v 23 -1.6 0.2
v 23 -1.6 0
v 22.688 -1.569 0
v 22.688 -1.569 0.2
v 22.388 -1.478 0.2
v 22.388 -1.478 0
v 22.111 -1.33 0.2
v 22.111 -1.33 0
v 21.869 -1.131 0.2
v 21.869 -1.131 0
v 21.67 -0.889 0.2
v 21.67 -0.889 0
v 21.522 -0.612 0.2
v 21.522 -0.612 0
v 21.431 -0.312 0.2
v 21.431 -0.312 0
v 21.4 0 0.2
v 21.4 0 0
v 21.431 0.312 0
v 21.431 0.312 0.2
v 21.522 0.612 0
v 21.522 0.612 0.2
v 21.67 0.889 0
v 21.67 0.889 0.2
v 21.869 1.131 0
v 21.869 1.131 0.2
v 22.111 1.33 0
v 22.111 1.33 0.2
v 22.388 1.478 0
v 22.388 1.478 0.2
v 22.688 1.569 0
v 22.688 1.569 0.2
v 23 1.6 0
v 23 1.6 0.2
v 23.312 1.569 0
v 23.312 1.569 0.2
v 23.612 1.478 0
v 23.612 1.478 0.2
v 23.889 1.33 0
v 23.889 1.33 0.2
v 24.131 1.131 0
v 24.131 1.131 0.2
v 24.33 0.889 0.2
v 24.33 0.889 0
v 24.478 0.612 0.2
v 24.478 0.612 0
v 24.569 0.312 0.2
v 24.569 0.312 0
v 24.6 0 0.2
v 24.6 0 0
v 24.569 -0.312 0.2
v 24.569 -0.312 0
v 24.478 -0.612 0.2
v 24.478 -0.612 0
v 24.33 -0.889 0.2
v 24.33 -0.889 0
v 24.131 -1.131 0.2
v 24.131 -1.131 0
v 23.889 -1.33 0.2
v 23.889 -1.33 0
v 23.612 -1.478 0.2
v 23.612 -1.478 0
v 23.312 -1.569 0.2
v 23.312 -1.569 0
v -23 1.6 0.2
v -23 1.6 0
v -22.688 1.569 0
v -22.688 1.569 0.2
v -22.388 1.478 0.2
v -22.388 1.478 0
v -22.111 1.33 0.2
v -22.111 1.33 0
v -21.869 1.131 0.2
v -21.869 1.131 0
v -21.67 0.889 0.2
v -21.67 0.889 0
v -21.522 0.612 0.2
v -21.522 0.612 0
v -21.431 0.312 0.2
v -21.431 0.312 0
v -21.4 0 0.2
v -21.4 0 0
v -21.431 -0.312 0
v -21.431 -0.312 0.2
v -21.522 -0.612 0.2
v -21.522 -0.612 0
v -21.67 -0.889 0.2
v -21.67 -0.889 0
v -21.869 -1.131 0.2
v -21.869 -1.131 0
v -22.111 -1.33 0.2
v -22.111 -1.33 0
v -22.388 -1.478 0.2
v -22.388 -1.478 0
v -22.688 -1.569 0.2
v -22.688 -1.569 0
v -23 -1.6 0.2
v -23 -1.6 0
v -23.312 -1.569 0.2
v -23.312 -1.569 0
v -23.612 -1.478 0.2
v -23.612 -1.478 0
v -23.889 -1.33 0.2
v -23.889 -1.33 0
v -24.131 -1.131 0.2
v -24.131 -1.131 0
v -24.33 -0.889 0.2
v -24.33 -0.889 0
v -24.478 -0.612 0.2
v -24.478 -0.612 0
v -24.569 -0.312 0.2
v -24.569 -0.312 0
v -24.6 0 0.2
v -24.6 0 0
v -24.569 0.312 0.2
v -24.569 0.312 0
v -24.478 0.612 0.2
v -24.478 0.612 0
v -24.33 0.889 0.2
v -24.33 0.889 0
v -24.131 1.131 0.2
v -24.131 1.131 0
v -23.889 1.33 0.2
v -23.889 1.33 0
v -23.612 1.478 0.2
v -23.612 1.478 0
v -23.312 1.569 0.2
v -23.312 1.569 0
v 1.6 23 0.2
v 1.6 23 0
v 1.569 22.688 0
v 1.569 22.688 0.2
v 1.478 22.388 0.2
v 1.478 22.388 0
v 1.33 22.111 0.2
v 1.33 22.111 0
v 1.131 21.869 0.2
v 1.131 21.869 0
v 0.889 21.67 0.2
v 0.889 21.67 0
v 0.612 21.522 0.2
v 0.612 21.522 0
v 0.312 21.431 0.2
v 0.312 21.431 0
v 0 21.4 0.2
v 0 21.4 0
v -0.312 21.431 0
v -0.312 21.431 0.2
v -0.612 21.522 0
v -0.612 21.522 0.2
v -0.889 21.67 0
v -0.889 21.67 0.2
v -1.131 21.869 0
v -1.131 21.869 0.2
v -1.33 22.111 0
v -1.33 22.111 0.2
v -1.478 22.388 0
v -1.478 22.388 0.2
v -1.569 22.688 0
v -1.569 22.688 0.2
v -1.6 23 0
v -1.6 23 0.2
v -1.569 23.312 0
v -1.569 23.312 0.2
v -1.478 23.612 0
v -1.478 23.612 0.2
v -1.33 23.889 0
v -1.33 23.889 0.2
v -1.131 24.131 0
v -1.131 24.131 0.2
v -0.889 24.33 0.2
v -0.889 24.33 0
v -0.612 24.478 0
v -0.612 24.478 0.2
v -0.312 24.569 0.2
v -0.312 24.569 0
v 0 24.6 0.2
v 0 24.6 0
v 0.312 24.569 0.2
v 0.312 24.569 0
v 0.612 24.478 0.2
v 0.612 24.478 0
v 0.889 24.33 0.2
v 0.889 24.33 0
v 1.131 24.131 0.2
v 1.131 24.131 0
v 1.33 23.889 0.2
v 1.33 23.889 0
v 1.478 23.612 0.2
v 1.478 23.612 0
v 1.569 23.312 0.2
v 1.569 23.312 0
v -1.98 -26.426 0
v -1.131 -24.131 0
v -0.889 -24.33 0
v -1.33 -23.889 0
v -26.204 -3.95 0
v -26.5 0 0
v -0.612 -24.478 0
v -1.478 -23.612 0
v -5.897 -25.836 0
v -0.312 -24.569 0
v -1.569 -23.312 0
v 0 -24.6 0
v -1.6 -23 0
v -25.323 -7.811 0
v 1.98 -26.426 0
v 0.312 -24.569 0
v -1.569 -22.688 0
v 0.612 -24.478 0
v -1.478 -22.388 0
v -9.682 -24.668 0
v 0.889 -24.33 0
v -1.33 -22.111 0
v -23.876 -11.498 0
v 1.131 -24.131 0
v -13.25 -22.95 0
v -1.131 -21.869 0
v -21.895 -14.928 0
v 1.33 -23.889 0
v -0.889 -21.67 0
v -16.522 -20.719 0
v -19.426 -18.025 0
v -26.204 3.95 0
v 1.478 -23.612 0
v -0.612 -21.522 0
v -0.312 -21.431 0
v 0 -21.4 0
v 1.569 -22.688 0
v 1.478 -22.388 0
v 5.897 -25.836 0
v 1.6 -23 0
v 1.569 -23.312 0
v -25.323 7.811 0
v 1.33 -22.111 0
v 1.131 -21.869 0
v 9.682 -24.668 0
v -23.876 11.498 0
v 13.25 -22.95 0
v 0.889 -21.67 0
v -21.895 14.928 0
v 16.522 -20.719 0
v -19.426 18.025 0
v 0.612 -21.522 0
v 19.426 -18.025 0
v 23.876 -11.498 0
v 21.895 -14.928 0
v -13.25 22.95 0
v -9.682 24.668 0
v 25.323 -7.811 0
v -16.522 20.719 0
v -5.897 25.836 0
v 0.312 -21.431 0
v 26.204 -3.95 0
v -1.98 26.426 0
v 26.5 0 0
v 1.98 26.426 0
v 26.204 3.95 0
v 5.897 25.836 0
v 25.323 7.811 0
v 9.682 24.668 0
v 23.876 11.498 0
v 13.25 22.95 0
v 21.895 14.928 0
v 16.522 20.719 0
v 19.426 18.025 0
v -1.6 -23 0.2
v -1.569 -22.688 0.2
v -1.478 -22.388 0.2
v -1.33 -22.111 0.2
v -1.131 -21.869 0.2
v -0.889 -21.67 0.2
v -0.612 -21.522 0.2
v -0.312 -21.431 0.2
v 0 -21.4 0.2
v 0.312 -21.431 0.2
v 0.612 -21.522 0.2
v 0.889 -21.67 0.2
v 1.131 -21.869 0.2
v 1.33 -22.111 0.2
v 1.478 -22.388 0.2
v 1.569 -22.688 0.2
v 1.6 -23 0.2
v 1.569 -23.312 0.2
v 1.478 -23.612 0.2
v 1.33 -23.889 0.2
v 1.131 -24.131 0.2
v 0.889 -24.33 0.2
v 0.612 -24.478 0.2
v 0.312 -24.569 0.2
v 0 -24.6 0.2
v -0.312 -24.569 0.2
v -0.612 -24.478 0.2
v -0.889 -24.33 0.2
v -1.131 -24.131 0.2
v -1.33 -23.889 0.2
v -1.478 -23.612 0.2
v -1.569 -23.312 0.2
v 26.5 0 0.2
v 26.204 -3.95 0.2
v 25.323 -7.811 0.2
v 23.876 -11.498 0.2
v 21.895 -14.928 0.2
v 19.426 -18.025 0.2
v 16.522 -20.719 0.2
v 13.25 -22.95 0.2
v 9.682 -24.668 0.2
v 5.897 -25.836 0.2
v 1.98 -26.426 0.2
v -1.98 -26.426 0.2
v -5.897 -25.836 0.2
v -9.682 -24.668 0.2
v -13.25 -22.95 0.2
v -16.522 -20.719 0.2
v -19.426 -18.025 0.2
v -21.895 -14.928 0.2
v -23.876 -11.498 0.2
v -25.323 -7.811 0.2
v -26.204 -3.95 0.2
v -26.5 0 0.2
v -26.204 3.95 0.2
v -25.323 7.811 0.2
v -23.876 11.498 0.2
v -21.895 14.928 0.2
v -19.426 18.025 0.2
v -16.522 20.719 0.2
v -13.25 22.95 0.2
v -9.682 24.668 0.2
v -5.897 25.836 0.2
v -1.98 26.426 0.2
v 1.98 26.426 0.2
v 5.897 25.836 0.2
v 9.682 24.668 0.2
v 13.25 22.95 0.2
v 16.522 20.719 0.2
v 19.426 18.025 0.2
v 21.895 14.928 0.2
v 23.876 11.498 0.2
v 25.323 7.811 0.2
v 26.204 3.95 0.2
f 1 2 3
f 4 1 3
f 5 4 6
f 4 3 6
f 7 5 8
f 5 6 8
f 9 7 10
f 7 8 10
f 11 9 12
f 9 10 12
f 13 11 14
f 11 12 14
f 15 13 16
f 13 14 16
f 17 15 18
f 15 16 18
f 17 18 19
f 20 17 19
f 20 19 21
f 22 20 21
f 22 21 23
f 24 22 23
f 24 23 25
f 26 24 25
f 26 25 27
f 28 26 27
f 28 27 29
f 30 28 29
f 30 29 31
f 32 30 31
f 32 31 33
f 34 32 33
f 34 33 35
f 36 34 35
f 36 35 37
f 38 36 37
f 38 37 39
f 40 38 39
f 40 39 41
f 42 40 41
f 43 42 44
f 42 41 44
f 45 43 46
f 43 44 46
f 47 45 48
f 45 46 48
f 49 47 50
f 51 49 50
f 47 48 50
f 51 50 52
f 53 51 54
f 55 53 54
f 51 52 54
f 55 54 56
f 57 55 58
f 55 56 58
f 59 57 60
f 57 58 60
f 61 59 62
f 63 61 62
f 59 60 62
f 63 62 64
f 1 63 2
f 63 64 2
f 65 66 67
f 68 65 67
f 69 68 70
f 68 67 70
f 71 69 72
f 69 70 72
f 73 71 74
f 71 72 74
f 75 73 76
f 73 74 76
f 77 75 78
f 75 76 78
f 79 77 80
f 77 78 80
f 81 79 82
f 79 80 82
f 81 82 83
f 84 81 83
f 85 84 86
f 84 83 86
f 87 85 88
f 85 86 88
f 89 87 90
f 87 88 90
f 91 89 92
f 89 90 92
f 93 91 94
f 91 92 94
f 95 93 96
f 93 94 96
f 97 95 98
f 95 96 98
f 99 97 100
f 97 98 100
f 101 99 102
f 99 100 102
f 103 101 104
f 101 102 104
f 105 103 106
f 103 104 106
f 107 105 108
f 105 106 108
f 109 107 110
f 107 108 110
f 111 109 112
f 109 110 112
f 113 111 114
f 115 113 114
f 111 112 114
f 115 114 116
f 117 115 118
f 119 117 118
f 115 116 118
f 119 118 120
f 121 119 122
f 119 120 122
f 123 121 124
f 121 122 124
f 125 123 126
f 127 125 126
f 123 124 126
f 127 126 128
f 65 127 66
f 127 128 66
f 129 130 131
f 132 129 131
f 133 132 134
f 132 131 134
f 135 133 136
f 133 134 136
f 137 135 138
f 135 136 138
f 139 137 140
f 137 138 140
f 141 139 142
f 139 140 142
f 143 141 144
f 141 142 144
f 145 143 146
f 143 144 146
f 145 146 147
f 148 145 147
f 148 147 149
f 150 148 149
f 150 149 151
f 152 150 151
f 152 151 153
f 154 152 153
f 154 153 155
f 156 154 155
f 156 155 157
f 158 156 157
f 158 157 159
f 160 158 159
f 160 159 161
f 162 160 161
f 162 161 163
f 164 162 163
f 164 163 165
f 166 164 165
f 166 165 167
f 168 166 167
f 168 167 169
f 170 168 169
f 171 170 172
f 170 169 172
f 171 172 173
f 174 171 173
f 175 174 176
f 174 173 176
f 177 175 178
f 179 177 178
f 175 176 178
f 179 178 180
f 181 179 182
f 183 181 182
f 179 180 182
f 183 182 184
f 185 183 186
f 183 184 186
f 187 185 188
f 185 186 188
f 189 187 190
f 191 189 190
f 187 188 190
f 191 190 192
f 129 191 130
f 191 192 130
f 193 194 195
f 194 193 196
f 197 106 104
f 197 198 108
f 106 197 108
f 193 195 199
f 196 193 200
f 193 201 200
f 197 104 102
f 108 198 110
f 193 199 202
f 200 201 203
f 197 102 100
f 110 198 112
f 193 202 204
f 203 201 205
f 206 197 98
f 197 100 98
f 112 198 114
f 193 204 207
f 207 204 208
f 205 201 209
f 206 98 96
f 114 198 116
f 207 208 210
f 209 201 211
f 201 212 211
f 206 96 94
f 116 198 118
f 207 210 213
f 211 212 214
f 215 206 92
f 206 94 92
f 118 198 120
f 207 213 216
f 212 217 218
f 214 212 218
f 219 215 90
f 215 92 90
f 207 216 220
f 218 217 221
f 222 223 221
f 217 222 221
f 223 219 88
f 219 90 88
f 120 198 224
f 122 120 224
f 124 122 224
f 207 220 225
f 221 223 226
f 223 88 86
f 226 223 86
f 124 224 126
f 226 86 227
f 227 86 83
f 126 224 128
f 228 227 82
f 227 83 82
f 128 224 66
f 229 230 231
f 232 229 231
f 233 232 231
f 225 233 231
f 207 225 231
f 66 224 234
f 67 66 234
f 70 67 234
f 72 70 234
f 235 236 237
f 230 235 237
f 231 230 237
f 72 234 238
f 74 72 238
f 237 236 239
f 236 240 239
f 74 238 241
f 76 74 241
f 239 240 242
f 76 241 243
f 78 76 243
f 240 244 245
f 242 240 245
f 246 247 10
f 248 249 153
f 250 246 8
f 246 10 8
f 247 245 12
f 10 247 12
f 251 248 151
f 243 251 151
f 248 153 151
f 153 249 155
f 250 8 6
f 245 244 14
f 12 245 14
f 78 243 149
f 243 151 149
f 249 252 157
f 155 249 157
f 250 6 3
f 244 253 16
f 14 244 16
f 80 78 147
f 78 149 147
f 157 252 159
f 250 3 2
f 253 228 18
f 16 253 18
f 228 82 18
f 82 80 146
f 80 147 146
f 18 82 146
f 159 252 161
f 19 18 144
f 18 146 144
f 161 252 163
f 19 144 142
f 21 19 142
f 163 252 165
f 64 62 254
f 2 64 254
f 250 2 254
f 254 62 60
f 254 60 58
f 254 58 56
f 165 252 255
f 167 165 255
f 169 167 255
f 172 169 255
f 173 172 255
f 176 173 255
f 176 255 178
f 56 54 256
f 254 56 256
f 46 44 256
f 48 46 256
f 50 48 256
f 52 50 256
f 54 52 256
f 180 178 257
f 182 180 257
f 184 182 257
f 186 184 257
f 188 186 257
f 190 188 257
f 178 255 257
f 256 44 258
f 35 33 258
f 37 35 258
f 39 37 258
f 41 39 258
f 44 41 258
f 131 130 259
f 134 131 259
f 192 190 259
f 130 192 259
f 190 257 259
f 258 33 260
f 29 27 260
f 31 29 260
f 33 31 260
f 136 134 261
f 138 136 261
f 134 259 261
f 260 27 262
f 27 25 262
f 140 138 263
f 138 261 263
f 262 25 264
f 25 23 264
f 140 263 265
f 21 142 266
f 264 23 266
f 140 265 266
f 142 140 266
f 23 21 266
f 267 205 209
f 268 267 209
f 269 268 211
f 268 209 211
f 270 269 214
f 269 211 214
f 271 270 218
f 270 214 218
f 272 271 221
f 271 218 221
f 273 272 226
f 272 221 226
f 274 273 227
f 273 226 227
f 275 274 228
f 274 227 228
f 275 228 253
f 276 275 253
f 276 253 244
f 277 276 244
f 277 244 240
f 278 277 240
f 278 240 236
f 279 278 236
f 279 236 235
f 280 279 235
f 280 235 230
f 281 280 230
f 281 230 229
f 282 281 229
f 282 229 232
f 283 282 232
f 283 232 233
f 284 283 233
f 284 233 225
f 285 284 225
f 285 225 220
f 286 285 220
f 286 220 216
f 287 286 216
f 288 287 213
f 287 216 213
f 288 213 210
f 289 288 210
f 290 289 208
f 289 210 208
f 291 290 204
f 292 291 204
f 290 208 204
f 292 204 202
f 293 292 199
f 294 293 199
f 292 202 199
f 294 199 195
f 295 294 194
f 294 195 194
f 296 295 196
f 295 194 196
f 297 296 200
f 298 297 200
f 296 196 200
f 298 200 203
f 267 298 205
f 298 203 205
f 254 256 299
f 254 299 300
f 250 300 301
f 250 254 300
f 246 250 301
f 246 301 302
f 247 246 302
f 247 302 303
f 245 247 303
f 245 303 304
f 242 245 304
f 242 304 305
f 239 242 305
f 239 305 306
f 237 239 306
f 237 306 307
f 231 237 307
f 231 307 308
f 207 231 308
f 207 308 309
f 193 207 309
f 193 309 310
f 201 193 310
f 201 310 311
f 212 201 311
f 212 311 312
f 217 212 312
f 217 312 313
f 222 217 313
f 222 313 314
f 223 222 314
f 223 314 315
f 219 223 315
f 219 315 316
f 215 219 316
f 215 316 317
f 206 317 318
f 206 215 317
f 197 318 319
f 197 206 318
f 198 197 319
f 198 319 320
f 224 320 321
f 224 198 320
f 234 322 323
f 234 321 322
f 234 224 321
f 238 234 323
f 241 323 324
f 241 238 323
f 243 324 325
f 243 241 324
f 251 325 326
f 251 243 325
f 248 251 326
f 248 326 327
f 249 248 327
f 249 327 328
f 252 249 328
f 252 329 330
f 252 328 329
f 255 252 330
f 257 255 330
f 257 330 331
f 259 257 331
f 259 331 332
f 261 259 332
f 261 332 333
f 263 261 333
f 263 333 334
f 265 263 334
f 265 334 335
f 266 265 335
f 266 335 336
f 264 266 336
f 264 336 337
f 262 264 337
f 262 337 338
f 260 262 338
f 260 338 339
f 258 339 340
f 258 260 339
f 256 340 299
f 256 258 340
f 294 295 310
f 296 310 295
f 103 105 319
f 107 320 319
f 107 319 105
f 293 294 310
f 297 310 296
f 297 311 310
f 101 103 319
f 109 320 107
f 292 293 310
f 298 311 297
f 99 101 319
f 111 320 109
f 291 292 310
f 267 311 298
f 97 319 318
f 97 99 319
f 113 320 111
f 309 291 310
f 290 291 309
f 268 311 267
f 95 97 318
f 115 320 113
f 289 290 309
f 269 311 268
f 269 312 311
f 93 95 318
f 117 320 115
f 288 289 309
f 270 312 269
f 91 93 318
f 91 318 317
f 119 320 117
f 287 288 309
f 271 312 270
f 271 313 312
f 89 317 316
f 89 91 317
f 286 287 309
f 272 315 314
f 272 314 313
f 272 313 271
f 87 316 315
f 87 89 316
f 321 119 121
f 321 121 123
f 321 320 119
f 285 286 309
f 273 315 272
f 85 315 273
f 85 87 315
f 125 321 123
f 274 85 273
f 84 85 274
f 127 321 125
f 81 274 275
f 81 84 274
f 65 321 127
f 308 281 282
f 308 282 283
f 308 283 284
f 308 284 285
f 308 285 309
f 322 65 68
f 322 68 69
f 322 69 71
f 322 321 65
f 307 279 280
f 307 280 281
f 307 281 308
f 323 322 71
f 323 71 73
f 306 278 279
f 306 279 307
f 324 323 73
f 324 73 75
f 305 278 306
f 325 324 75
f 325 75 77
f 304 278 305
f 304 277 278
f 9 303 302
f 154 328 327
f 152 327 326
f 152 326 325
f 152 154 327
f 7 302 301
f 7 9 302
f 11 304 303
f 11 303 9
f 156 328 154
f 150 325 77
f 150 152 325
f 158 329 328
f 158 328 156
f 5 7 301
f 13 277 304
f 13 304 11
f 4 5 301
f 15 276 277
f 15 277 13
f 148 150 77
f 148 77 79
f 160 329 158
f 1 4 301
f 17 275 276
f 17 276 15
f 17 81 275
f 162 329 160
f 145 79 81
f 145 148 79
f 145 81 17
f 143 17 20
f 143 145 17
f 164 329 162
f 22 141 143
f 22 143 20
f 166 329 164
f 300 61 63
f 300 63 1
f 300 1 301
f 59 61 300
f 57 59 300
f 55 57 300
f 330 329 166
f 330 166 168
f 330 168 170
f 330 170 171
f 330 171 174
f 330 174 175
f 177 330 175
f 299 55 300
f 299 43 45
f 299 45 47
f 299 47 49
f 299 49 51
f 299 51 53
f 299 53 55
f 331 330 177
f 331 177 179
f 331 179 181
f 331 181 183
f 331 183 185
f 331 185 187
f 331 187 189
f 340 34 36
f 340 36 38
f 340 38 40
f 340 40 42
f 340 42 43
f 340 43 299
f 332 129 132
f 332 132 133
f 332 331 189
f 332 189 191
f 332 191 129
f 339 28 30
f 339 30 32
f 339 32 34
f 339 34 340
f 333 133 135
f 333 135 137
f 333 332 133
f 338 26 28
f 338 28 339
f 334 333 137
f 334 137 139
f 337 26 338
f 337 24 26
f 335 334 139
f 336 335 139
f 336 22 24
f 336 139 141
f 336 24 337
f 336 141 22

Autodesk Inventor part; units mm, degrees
ref_plane "YZ Plane" through (0, 0, 0) normal (1, 0, 0) x (0, 1, 0)
ref_plane "XZ Plane" through (0, 0, 0) normal (0, 1, 0) x (-1, 0, 0)
ref_plane "XY Plane" through (0, 0, 0) normal (0, 0, 1) x (1, 0, 0)
sketch "Sketch1" plane through (0, 0, 0) normal (0, 0, 1) x (1, 0, 0)
  circle A0 centre (0, 0) radius 26.5
  dimension "d0" = 53
extrude "Extrusion1" add sketch "Sketch1" along normal blind 0.2
sketch "Sketch2" plane through (0, 0, 0.2) normal (0, 0, 1) x (1, 0, 0)
  circle A0 centre (0, 0) radius 23 construction
  point P0 (23, 0)
  dimension "d3" = 46
hole "Hole1" at (23, 0, 0.2) direction (0, 0, -1) diameter 3.2 end through all
pattern_circular "Circular Pattern1" count 4 over 360 about axis through (0, 0, 0) along (0, 0, 1) of "Hole1"
properties part number "probe-gate-mesh-circle-53mm" material "Stainless Steel"
